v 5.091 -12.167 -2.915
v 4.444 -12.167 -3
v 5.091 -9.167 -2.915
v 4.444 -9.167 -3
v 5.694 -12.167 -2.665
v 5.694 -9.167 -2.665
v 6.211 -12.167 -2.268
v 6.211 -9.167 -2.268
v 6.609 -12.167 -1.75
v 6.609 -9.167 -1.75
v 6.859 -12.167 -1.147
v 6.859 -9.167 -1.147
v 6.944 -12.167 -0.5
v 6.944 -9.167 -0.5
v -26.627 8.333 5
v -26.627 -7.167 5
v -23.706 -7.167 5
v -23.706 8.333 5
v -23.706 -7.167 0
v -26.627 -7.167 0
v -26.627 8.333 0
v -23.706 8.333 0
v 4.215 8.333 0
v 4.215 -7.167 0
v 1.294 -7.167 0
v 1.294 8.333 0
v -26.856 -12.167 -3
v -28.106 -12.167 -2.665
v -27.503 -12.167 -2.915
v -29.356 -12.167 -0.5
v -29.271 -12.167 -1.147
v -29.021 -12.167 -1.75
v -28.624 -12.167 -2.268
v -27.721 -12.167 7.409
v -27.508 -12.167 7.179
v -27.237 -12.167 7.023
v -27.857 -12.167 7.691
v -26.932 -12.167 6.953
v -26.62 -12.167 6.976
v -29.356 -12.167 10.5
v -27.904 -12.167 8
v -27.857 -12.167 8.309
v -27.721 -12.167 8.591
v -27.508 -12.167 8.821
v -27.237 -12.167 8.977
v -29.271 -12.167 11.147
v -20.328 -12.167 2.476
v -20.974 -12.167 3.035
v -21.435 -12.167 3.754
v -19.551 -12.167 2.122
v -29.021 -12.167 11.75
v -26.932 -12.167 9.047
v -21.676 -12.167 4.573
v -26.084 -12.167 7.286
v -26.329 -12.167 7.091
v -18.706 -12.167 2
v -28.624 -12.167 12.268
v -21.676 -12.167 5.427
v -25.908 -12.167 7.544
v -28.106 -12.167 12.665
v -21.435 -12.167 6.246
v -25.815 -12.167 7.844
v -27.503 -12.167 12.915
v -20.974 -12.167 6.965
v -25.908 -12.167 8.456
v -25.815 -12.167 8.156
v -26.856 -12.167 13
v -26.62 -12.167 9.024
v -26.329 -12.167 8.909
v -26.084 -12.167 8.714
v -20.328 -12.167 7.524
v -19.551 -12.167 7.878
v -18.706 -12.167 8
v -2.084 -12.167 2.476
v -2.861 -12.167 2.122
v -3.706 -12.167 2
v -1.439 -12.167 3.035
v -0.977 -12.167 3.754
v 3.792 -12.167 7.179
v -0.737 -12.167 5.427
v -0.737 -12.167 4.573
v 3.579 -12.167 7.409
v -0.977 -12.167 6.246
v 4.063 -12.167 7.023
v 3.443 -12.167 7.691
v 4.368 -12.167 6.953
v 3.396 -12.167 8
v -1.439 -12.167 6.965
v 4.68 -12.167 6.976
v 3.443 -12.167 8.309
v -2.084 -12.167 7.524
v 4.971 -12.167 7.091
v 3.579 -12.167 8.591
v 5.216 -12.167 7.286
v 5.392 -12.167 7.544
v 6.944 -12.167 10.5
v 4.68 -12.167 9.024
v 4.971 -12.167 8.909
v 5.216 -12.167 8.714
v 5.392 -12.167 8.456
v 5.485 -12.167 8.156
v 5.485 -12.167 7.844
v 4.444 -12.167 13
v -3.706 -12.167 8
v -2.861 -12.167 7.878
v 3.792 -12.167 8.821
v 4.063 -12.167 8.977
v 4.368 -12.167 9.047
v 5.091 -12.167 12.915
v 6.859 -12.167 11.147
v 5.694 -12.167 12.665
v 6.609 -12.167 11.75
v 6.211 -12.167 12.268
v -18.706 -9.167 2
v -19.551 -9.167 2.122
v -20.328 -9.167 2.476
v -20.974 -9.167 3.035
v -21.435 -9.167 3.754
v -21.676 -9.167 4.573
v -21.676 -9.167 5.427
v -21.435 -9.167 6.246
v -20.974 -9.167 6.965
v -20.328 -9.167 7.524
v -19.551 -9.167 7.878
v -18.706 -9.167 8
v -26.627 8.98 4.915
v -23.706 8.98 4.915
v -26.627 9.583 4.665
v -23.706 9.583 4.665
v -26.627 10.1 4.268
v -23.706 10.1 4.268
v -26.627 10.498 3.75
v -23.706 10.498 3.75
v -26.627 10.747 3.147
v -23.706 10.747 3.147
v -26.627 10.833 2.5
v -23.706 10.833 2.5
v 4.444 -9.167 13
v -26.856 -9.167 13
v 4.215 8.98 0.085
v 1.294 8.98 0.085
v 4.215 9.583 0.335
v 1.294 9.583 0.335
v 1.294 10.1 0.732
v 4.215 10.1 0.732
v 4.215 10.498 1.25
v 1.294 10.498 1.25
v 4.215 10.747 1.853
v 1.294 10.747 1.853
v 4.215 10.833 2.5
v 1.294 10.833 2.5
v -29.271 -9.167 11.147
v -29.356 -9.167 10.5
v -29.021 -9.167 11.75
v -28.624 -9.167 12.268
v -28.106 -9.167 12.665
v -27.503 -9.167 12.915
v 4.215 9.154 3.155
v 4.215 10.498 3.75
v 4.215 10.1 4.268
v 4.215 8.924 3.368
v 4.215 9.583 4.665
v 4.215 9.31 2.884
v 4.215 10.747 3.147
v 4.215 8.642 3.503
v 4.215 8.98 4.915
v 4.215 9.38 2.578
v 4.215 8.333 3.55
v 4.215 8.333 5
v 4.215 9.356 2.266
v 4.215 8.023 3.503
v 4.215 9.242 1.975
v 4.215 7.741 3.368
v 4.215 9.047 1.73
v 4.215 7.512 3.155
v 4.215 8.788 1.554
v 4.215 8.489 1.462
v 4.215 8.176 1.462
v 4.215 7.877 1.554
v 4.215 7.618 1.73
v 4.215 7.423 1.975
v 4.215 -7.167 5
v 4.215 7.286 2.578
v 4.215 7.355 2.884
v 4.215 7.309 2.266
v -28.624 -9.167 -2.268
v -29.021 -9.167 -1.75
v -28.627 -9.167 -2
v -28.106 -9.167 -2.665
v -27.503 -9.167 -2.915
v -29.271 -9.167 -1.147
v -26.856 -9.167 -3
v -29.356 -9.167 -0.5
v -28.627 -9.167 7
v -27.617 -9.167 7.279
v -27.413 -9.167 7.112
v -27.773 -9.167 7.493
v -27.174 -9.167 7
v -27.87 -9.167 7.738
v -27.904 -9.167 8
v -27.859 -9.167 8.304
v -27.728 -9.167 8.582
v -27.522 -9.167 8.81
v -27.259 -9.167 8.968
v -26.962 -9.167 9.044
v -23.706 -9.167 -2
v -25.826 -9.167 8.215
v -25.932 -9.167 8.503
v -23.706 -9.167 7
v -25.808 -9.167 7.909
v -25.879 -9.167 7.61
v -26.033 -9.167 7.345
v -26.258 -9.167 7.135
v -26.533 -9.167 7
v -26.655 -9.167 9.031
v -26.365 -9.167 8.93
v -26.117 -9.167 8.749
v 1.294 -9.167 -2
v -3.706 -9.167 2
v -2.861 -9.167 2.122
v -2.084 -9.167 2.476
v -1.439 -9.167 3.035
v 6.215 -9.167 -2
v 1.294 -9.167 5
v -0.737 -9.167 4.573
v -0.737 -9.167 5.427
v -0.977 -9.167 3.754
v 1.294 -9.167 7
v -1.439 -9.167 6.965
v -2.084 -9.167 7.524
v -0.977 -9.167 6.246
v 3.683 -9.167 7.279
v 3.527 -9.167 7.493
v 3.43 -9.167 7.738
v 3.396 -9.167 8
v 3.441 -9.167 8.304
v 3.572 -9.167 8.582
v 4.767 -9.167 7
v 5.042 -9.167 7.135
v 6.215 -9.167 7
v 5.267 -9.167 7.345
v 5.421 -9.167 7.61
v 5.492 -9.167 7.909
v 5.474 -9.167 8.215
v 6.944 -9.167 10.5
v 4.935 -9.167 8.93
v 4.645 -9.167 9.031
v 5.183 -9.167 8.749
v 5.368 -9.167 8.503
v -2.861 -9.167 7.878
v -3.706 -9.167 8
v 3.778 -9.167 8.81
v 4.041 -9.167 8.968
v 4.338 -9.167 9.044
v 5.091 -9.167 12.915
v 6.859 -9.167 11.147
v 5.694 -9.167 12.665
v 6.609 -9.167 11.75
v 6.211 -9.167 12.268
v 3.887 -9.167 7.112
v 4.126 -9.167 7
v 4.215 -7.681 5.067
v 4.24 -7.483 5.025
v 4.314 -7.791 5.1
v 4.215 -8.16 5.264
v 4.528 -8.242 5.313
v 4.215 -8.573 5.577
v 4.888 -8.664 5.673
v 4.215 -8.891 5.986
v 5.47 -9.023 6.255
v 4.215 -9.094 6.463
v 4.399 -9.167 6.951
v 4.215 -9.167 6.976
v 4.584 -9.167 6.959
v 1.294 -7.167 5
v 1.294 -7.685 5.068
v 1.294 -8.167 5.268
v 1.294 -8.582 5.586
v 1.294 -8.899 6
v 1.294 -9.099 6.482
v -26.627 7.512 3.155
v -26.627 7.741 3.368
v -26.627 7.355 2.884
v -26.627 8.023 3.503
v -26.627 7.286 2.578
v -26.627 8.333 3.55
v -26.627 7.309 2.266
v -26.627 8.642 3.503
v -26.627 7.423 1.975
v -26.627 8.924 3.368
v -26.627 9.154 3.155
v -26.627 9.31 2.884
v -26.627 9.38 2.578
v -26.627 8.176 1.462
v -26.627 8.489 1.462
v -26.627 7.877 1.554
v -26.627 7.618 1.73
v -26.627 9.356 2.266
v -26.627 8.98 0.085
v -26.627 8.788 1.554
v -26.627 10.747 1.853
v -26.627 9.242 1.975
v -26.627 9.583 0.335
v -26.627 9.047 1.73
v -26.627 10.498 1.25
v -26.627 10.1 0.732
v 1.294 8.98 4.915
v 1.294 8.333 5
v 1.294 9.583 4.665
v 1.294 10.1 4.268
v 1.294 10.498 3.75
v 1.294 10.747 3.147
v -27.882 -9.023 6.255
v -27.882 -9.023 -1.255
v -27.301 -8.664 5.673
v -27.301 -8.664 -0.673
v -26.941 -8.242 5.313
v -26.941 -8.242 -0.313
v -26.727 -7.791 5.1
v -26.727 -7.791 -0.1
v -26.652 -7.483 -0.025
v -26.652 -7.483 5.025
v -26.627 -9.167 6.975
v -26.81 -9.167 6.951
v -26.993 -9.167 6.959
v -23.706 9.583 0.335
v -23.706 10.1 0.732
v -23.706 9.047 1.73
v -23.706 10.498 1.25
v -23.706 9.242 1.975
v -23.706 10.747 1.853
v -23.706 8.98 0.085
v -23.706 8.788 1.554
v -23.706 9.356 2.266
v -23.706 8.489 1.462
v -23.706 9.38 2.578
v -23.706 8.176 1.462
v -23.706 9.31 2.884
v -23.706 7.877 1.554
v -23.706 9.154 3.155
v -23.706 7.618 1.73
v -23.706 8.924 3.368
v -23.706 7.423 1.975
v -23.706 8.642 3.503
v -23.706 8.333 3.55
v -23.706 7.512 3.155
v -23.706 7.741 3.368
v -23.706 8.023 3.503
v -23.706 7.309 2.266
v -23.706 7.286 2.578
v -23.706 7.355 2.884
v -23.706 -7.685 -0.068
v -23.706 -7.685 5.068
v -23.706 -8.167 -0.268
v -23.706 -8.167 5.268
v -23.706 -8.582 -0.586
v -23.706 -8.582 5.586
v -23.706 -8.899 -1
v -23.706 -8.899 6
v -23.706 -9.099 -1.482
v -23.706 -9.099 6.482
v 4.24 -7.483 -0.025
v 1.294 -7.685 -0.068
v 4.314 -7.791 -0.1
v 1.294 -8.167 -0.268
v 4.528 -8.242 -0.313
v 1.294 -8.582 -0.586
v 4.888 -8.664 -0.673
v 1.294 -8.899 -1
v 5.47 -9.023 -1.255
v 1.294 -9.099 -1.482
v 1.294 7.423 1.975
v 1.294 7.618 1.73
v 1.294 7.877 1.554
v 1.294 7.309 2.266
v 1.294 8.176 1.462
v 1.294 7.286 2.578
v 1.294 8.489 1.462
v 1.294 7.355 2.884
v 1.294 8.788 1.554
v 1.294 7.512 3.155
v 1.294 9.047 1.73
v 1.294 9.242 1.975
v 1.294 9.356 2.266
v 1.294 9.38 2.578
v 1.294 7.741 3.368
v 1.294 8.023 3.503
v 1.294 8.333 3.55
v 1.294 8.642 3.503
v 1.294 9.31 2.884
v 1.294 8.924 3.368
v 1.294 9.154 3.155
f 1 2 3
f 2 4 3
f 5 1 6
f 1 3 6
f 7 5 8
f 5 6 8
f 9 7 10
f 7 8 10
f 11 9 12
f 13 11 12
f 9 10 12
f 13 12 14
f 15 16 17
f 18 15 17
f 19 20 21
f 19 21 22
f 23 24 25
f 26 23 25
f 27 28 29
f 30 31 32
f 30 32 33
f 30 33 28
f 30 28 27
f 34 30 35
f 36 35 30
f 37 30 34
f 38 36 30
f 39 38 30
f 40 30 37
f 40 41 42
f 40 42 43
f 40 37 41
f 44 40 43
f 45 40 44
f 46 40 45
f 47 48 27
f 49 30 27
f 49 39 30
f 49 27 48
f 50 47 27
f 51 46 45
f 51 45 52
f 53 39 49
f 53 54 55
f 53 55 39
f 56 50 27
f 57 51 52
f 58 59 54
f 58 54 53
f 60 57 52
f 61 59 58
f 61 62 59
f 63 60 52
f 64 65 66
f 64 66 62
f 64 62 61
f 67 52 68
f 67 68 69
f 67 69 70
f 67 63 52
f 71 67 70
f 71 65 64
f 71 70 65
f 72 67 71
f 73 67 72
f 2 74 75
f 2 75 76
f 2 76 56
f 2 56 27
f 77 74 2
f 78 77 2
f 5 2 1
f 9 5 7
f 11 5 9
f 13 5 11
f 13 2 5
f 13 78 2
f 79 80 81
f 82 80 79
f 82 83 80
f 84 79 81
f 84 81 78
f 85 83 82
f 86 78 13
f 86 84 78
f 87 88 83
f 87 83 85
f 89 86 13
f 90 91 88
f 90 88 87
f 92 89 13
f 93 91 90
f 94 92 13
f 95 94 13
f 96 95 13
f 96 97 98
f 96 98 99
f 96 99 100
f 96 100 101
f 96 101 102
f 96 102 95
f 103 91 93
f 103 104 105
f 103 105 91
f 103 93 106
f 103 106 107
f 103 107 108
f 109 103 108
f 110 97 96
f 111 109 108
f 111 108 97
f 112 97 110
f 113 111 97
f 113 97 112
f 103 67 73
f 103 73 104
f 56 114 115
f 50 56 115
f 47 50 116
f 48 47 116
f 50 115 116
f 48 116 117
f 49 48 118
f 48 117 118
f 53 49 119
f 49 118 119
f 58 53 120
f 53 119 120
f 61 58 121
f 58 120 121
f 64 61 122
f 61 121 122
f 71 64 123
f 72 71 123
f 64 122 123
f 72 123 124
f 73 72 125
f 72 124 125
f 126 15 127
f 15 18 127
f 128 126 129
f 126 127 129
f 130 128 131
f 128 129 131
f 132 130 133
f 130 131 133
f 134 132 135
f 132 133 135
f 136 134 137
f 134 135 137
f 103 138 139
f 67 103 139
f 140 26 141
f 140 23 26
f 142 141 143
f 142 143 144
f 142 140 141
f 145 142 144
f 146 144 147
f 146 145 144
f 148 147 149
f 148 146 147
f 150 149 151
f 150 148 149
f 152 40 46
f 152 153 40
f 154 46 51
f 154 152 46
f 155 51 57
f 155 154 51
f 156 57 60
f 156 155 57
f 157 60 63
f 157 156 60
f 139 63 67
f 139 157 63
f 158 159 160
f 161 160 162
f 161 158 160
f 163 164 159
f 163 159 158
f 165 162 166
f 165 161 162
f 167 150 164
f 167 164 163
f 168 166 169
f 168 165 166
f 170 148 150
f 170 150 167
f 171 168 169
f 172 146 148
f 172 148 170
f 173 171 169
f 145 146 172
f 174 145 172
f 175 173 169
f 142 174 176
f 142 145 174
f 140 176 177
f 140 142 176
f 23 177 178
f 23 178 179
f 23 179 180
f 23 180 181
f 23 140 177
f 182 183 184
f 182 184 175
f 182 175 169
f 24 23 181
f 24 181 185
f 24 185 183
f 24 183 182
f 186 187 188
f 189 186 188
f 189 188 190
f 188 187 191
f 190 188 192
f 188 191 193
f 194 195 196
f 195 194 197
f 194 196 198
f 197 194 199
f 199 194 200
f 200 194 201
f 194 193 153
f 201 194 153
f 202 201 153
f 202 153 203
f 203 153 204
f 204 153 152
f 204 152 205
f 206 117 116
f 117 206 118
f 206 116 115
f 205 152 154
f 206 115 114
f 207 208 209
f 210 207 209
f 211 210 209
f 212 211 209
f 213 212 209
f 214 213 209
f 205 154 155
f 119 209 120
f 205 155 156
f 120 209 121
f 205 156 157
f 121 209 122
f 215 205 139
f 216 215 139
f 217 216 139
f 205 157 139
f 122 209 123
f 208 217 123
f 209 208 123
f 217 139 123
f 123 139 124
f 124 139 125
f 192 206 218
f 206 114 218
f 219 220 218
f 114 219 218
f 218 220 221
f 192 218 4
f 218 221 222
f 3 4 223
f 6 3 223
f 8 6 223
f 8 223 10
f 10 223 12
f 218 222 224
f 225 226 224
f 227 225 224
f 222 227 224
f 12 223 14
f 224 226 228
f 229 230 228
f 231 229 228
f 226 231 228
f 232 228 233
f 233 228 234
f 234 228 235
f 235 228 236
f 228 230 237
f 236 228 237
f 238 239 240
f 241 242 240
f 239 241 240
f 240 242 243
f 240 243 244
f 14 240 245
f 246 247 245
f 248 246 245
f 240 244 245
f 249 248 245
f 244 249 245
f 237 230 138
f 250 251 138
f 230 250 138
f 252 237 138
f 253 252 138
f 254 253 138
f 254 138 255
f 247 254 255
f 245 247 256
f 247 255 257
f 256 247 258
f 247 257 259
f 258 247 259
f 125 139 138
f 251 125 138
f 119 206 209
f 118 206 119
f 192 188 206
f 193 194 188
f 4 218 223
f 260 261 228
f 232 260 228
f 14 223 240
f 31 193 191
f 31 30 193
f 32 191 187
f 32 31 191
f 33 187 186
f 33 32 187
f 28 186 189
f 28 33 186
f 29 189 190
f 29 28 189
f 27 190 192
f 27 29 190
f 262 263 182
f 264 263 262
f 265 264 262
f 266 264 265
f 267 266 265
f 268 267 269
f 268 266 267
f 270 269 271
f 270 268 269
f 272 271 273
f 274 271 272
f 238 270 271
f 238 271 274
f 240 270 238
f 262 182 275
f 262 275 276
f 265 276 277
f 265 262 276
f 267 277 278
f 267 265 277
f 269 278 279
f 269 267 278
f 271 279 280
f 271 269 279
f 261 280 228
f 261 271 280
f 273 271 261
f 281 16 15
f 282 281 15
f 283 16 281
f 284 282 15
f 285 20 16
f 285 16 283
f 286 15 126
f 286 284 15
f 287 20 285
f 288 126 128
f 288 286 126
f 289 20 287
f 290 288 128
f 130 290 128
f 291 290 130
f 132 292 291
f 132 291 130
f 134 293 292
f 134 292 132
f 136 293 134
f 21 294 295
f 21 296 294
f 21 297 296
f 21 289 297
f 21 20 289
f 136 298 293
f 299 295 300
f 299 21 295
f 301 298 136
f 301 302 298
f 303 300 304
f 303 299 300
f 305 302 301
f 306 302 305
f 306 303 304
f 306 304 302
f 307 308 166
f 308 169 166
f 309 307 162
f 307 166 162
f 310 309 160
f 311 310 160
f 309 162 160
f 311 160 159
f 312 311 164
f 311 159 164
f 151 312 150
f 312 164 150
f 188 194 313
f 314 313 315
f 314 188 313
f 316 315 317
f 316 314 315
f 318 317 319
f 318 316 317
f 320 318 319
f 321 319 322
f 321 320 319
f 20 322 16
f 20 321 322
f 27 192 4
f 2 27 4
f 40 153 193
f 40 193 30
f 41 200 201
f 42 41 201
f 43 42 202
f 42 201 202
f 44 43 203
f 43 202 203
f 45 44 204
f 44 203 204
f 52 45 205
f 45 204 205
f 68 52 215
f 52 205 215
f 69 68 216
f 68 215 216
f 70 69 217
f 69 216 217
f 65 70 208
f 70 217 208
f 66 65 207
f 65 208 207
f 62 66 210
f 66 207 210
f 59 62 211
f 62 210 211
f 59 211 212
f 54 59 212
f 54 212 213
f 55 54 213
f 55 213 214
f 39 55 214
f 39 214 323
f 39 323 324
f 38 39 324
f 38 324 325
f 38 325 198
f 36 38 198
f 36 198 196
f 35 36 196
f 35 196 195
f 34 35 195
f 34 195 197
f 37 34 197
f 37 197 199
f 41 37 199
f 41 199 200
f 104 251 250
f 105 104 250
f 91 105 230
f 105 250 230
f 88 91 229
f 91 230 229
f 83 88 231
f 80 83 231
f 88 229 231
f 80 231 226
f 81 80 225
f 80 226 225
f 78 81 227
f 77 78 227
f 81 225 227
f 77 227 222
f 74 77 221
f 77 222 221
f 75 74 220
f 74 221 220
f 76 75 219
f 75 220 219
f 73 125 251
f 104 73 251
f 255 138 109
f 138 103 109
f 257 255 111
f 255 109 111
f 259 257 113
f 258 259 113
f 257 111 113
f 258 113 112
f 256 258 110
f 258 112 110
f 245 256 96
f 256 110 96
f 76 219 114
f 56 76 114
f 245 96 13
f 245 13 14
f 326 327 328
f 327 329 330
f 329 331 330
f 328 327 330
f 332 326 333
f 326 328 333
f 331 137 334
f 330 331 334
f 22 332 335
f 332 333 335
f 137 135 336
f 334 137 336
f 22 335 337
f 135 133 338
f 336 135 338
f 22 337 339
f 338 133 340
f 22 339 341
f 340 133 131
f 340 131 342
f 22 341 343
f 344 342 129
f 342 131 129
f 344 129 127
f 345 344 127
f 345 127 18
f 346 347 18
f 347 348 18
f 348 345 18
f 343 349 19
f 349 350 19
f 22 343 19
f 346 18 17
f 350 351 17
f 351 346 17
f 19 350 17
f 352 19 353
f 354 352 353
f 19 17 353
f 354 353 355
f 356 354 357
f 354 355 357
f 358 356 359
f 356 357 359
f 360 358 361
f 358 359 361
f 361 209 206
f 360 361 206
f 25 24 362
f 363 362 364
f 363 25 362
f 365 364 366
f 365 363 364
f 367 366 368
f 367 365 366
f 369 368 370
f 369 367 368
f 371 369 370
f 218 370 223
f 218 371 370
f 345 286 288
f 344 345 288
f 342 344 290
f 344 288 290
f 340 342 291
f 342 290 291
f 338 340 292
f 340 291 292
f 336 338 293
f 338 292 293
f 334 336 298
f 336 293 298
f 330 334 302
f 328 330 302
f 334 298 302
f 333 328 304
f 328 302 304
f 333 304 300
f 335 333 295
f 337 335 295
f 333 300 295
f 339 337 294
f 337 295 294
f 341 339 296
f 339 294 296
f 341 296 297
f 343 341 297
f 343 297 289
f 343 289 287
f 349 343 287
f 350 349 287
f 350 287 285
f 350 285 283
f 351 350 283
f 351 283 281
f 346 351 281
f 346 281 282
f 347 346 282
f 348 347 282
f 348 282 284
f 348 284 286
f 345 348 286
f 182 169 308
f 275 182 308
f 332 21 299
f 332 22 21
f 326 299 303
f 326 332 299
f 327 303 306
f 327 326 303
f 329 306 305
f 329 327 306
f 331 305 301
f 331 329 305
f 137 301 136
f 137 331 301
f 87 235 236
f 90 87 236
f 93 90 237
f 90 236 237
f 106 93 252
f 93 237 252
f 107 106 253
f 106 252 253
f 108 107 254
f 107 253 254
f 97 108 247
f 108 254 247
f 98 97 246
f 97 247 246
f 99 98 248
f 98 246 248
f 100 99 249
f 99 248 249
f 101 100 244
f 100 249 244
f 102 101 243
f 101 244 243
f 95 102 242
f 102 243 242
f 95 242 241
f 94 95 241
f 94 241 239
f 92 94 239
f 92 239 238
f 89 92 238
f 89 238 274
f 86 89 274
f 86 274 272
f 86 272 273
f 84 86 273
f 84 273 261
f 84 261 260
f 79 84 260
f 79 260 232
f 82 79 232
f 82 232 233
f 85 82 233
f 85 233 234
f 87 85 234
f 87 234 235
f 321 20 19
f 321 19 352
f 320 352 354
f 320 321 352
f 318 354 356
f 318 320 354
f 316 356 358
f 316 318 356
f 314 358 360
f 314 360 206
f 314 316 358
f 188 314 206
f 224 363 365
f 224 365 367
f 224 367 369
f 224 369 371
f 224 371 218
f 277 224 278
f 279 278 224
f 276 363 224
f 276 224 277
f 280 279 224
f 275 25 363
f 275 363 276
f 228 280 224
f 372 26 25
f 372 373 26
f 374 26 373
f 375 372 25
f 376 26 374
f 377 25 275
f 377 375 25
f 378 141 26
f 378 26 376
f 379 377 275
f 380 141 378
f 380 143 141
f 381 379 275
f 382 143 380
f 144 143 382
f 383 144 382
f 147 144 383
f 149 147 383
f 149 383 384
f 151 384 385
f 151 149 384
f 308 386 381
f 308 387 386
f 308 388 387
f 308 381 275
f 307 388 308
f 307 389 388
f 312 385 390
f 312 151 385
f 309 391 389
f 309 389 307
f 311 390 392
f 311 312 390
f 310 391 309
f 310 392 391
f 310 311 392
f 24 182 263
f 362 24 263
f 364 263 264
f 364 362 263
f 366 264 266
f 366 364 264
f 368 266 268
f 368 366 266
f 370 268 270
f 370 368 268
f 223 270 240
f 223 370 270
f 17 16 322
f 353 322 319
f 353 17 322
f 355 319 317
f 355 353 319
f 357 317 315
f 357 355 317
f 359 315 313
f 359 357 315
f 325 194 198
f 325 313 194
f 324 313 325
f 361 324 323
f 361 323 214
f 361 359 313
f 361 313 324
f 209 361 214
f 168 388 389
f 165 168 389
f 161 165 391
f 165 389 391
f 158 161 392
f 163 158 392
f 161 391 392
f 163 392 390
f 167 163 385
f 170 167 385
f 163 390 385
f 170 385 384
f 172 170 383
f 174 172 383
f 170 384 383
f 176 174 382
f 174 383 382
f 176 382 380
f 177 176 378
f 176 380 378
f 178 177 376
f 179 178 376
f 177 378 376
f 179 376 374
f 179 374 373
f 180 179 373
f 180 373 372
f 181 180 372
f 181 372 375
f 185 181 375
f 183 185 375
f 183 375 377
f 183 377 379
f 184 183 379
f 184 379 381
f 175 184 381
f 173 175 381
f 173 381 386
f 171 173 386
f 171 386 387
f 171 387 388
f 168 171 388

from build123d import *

# Parameters (mm, degrees)
DODANIE_WYCI_GNI_CIE1_DEPTH = 5
DODANIE_WYCI_GNI_CIE4_DEPTH = 8
DODANIE_WYCI_GNI_CIE5_DEPTH = 3
SZKIC8_R                    = 1.05
WYTNIJ_WYCI_GNI_CIE1_DEPTH  = 38.825793195
SZKIC9_R                    = 1.05
WYTNIJ_WYCI_GNI_CIE2_DEPTH  = 39.000906522
ZAOKR_GLENIE1_R             = 2.5
ZAOKR_GLENIE2_R             = 2.5
ZAOKR_GLENIE3_R             = 2
WYTNIJ_WYCI_GNI_CIE3_DEPTH  = 38.825793195


# Some blends are built 0.0001 mm under size
with BuildPart() as part:
    # Szkic1 → Dodanie-wyciągnięcie1 (new body)
    with BuildSketch(Plane.XY):
        Polygon((6.943729276, -9.167385079), (6.943729276, -12.167385079), (-29.356270724, -12.167385079), (-29.356270724, -9.167385079), (-26.62744343, -9.167385079), (-26.62744343, 10.832614921), (-23.706270724, 10.832614921), (-23.706270724, -9.167385079), (1.293729276, -9.167385079), (1.293729276, 10.832614921), (4.214901981, 10.832614921), (4.214901981, -9.167385079), align=None)
    extrude(amount=DODANIE_WYCI_GNI_CIE1_DEPTH)

    # Szkic5 → Dodanie-wyciągnięcie4 (add)
    with BuildSketch(Plane.XY.offset(5)):
        Polygon((-26.62744343, -9.167385079), (-23.706270724, -9.167385079), (1.293729276, -9.167385079), (4.214901981, -9.167385079), (6.943729276, -9.167385079), (6.943729276, -12.167385079), (-29.356270724, -12.167385079), (-29.356270724, -9.167385079), align=None)
    extrude(amount=DODANIE_WYCI_GNI_CIE4_DEPTH)

    # Szkic7 → Dodanie-wyciągnięcie5 (add)
    with BuildSketch(Plane(origin=(0, 0, 0), x_dir=(-1, 0, 0), z_dir=(0, 0, -1))):
        Polygon((-4.214901981, -9.167385079), (-1.293729276, -9.167385079), (23.706270724, -9.167385079), (26.62744343, -9.167385079), (29.356270724, -9.167385079), (29.356270724, -12.167385079), (-6.943729276, -12.167385079), (-6.943729276, -9.167385079), align=None)
    extrude(amount=DODANIE_WYCI_GNI_CIE5_DEPTH)

    # Szkic8 → Wytnij-wyciągnięcie1 (cut, through all)
    with BuildSketch(Plane(origin=(0, -9.167385079, 0), x_dir=(1, 0, 0), z_dir=(0, 1, 0))):
        with Locations(Location((4.446418634, -8, 0), (0, 0, 180))):
            Circle(SZKIC8_R)
        with Locations(Location((-26.853581366, -8, 0), (0, 0, 180))):
            Circle(SZKIC8_R)
    extrude(amount=-WYTNIJ_WYCI_GNI_CIE1_DEPTH, mode=Mode.SUBTRACT)

    # Szkic9 → Wytnij-wyciągnięcie2 (cut, through all)
    with BuildSketch(Plane.ZY.offset(26.62744343)):
        with Locations((2.5, 8.332614921)):
            Circle(SZKIC9_R)
    extrude(amount=-WYTNIJ_WYCI_GNI_CIE2_DEPTH, mode=Mode.SUBTRACT)

    # Zaokrąglenie1
    zaokr_glenie1_edges = [part.edges().sort_by_distance(p)[0] for p in [
        (-29.356270724, -10.667385079, 13),
        (6.943729276, -10.667385079, 13),
        (6.943729276, -10.667385079, -3),
        (-29.356270724, -10.667385079, -3),
    ]]
    fillet(zaokr_glenie1_edges, radius=ZAOKR_GLENIE1_R)

    # Zaokrąglenie2
    zaokr_glenie2_edges = [part.edges().sort_by_distance(p)[0] for p in [
        (-25.166857077, 10.832614921, 5),
        (-25.166857077, 10.832614921, 0),
        (2.754315628, 10.832614921, 5),
        (2.754315628, 10.832614921, 0),
    ]]
    fillet(zaokr_glenie2_edges, radius=ZAOKR_GLENIE2_R - 0.0001)  # a hair under: the kernel refuses the full size

    # Zaokrąglenie3
    # the kernel refuses this fillet: 2 mm, written as the material it adds along each edge
    with BuildSketch(Plane(origin=(4.214901981, -9.167385079, 0), x_dir=(1, 0, 0), z_dir=(0, 0, 1))) as zaokr_glenie3_piece_1:
        with BuildLine():
            CenterArc((ZAOKR_GLENIE3_R, ZAOKR_GLENIE3_R), ZAOKR_GLENIE3_R, 180, 90)
            Line((0, ZAOKR_GLENIE3_R), (0, 0))
            Line((0, 0), (ZAOKR_GLENIE3_R, 0))
        make_face()
    extrude(amount=5)
    with BuildSketch(Plane(origin=(-26.62744343, -9.167385079, 0), x_dir=(-1, 0, 0), z_dir=(0, 0, 1))) as zaokr_glenie3_piece_2:
        with BuildLine():
            CenterArc((ZAOKR_GLENIE3_R, -ZAOKR_GLENIE3_R), ZAOKR_GLENIE3_R, 90, 90)
            Line((0, -ZAOKR_GLENIE3_R), (0, 0))
            Line((0, 0), (ZAOKR_GLENIE3_R, 0))
        make_face()
    extrude(amount=5)
    with BuildSketch(Plane(origin=(-23.706270724, -9.167385079, 5), x_dir=(0, 1, 0), z_dir=(-1, 0, 0))) as zaokr_glenie3_piece_3_section:
        with BuildLine():
            CenterArc((ZAOKR_GLENIE3_R, -ZAOKR_GLENIE3_R), ZAOKR_GLENIE3_R, 90, 90)
            Line((0, -ZAOKR_GLENIE3_R), (0, 0))
            Line((0, 0), (ZAOKR_GLENIE3_R, 0))
        make_face()
    zaokr_glenie3_piece_3 = extrude(amount=2.921172706, mode=Mode.PRIVATE)
    zaokr_glenie3_piece_3 = zaokr_glenie3_piece_3 - Plane(origin=(-26.853581366, -8.714586813, 8), x_dir=(-1, 0, 0), z_dir=(0, 1, 0)) * Cylinder(1.05, 14, mode=Mode.PRIVATE)
    add(zaokr_glenie3_piece_3)
    with BuildSketch(Plane(origin=(4.214901981, -9.167385079, 5), x_dir=(0, 0, 1), z_dir=(-1, 0, 0))) as zaokr_glenie3_piece_4_section:
        with BuildLine():
            CenterArc((ZAOKR_GLENIE3_R, ZAOKR_GLENIE3_R), ZAOKR_GLENIE3_R, 180, 90)
            Line((0, ZAOKR_GLENIE3_R), (0, 0))
            Line((0, 0), (ZAOKR_GLENIE3_R, 0))
        make_face()
    zaokr_glenie3_piece_4 = extrude(amount=2.921172706, mode=Mode.PRIVATE)
    zaokr_glenie3_piece_4 = zaokr_glenie3_piece_4 - Plane(origin=(4.446418634, -8.714587659, 8), x_dir=(-1, 0, 0), z_dir=(0, 1, 0)) * Cylinder(1.05, 14, mode=Mode.PRIVATE)
    add(zaokr_glenie3_piece_4)
    with BuildSketch(Plane(origin=(1.293729276, -9.167385079, 0), x_dir=(0, 0, -1), z_dir=(1, 0, 0))) as zaokr_glenie3_piece_5:
        with BuildLine():
            CenterArc((ZAOKR_GLENIE3_R, ZAOKR_GLENIE3_R), ZAOKR_GLENIE3_R, 180, 90)
            Line((0, ZAOKR_GLENIE3_R), (0, 0))
            Line((0, 0), (ZAOKR_GLENIE3_R, 0))
        make_face()
    extrude(amount=2.921172706)
    with BuildSketch(Plane(origin=(-26.62744343, -9.167385079, 0), x_dir=(0, 1, 0), z_dir=(1, 0, 0))) as zaokr_glenie3_piece_6:
        with BuildLine():
            CenterArc((ZAOKR_GLENIE3_R, -ZAOKR_GLENIE3_R), ZAOKR_GLENIE3_R, 90, 90)
            Line((0, -ZAOKR_GLENIE3_R), (0, 0))
            Line((0, 0), (ZAOKR_GLENIE3_R, 0))
        make_face()
    extrude(amount=2.921172706)
    with BuildSketch(Plane(origin=(4.214901981, -9.167385079, -5), x_dir=(1, 0, 0), z_dir=(0, 0, 1))) as zaokr_glenie3_piece_7a_section:
        with BuildLine():
            CenterArc((ZAOKR_GLENIE3_R, ZAOKR_GLENIE3_R), ZAOKR_GLENIE3_R, 180, 90)
            Line((0, ZAOKR_GLENIE3_R), (0, 0))
            Line((0, 0), (ZAOKR_GLENIE3_R, 0))
        make_face()
    zaokr_glenie3_piece_7a = extrude(amount=10, mode=Mode.PRIVATE)
    zaokr_glenie3_piece_7a = zaokr_glenie3_piece_7a & Plane(origin=(4.443729276, -8.70886388, -0.5), x_dir=(1, 0, 0), z_dir=(0, 1, 0)) * Cylinder(2.5, 28, mode=Mode.PRIVATE)
    zaokr_glenie3_piece_7a = split(zaokr_glenie3_piece_7a, bisect_by=Plane(origin=(4.654982767, -8.70886388, 0), z_dir=(0, 0, -1)), keep=Keep.TOP, mode=Mode.PRIVATE)
    with BuildSketch(Plane(origin=(1.293729276, -9.167385079, 0), x_dir=(0, 0, -1), z_dir=(1, 0, 0))) as zaokr_glenie3_piece_7b_section:
        with BuildLine():
            CenterArc((ZAOKR_GLENIE3_R, ZAOKR_GLENIE3_R), ZAOKR_GLENIE3_R, 180, 90)
            Line((0, ZAOKR_GLENIE3_R), (0, 0))
            Line((0, 0), (ZAOKR_GLENIE3_R, 0))
        make_face()
    zaokr_glenie3_piece_7b = extrude(amount=7.921172706, mode=Mode.PRIVATE)
    zaokr_glenie3_piece_7b = zaokr_glenie3_piece_7b & Plane(origin=(4.443729276, -8.713013539, -0.5), x_dir=(1, 0, 0), z_dir=(0, 1, 0)) * Cylinder(2.5, 24, mode=Mode.PRIVATE)
    zaokr_glenie3_piece_7b = split(zaokr_glenie3_piece_7b, bisect_by=Plane(origin=(4.214901981, -8.713013539, -0.447003407), z_dir=(1, 0, 0)), keep=Keep.TOP, mode=Mode.PRIVATE)
    zaokr_glenie3_piece_7 = zaokr_glenie3_piece_7a & zaokr_glenie3_piece_7b
    add(zaokr_glenie3_piece_7)
    with BuildSketch(Plane(origin=(4.214901981, -9.167385079, 0), x_dir=(1, 0, 0), z_dir=(0, 0, 1))) as zaokr_glenie3_piece_8a_section:
        with BuildLine():
            CenterArc((ZAOKR_GLENIE3_R, ZAOKR_GLENIE3_R), ZAOKR_GLENIE3_R, 180, 90)
            Line((0, ZAOKR_GLENIE3_R), (0, 0))
            Line((0, 0), (ZAOKR_GLENIE3_R, 0))
        make_face()
    zaokr_glenie3_piece_8a = extrude(amount=10, mode=Mode.PRIVATE)
    zaokr_glenie3_piece_8a = zaokr_glenie3_piece_8a - Plane(origin=(4.446418634, -9.113524986, 8), x_dir=(-1, 0, 0), z_dir=(0, 1, 0)) * Cylinder(1.05, 28, mode=Mode.PRIVATE)
    zaokr_glenie3_piece_8a = split(zaokr_glenie3_piece_8a, bisect_by=Plane(origin=(5.693435365, -9.113524986, 5), z_dir=(0, 0, 1)), keep=Keep.TOP, mode=Mode.PRIVATE)
    with BuildSketch(Plane(origin=(9.214901981, -9.167385079, 5), x_dir=(0, 0, 1), z_dir=(-1, 0, 0))) as zaokr_glenie3_piece_8b_section:
        with BuildLine():
            CenterArc((ZAOKR_GLENIE3_R, ZAOKR_GLENIE3_R), ZAOKR_GLENIE3_R, 180, 90)
            Line((0, ZAOKR_GLENIE3_R), (0, 0))
            Line((0, 0), (ZAOKR_GLENIE3_R, 0))
        make_face()
    zaokr_glenie3_piece_8b = extrude(amount=7.921172706, mode=Mode.PRIVATE)
    zaokr_glenie3_piece_8b = split(zaokr_glenie3_piece_8b, bisect_by=Plane(origin=(6.943729276, -8.714456285, 5.452342783), z_dir=(-1, 0, 0)), keep=Keep.TOP, mode=Mode.PRIVATE)
    zaokr_glenie3_piece_8b = zaokr_glenie3_piece_8b - Plane(origin=(4.446418634, -8.714456285, 8), x_dir=(-1, 0, 0), z_dir=(0, 1, 0)) * Cylinder(1.05, 24, mode=Mode.PRIVATE)
    zaokr_glenie3_piece_8b = split(zaokr_glenie3_piece_8b, bisect_by=Plane(origin=(4.214901981, -8.714456285, 5.452342783), z_dir=(1, 0, 0)), keep=Keep.TOP, mode=Mode.PRIVATE)
    zaokr_glenie3_piece_8 = zaokr_glenie3_piece_8a & zaokr_glenie3_piece_8b
    add(zaokr_glenie3_piece_8)
    with BuildSketch(Plane(origin=(-31.62744343, -9.167385079, 0), x_dir=(0, 1, 0), z_dir=(1, 0, 0))) as zaokr_glenie3_piece_9a_section:
        with BuildLine():
            CenterArc((ZAOKR_GLENIE3_R, -ZAOKR_GLENIE3_R), ZAOKR_GLENIE3_R, 90, 90)
            Line((0, -ZAOKR_GLENIE3_R), (0, 0))
            Line((0, 0), (ZAOKR_GLENIE3_R, 0))
        make_face()
    zaokr_glenie3_piece_9a = extrude(amount=7.921172706, mode=Mode.PRIVATE)
    zaokr_glenie3_piece_9a = split(zaokr_glenie3_piece_9a, bisect_by=Plane(origin=(-26.62744343, -8.713013524, -0.447003529), z_dir=(-1, 0, 0)), keep=Keep.TOP, mode=Mode.PRIVATE)
    zaokr_glenie3_piece_9a = zaokr_glenie3_piece_9a & Plane(origin=(-26.856270724, -8.713013524, -0.5), x_dir=(0, 0, -1), z_dir=(0, -1, 0)) * Cylinder(2.5, 24, mode=Mode.PRIVATE)
    with BuildSketch(Plane(origin=(-26.62744343, -9.167385079, -5), x_dir=(-1, 0, 0), z_dir=(0, 0, 1))) as zaokr_glenie3_piece_9b_section:
        with BuildLine():
            CenterArc((ZAOKR_GLENIE3_R, -ZAOKR_GLENIE3_R), ZAOKR_GLENIE3_R, 90, 90)
            Line((0, -ZAOKR_GLENIE3_R), (0, 0))
            Line((0, 0), (ZAOKR_GLENIE3_R, 0))
        make_face()
    zaokr_glenie3_piece_9b = extrude(amount=10, mode=Mode.PRIVATE)
    zaokr_glenie3_piece_9b = split(zaokr_glenie3_piece_9b, bisect_by=Plane(origin=(-27.067524529, -8.708863922, 0), z_dir=(0, 0, -1)), keep=Keep.TOP, mode=Mode.PRIVATE)
    zaokr_glenie3_piece_9b = zaokr_glenie3_piece_9b & Plane(origin=(-26.856270724, -8.708863922, -0.5), x_dir=(0, 0, -1), z_dir=(0, -1, 0)) * Cylinder(2.5, 29, mode=Mode.PRIVATE)
    zaokr_glenie3_piece_9 = zaokr_glenie3_piece_9a & zaokr_glenie3_piece_9b
    add(zaokr_glenie3_piece_9)
    with BuildSketch(Plane(origin=(-23.706270724, -9.167385079, 5), x_dir=(0, 1, 0), z_dir=(-1, 0, 0))) as zaokr_glenie3_piece_10a_section:
        with BuildLine():
            CenterArc((ZAOKR_GLENIE3_R, -ZAOKR_GLENIE3_R), ZAOKR_GLENIE3_R, 90, 90)
            Line((0, -ZAOKR_GLENIE3_R), (0, 0))
            Line((0, 0), (ZAOKR_GLENIE3_R, 0))
        make_face()
    zaokr_glenie3_piece_10a = extrude(amount=7.921172706, mode=Mode.PRIVATE)
    zaokr_glenie3_piece_10a = split(zaokr_glenie3_piece_10a, bisect_by=Plane(origin=(-26.62744343, -8.714457191, 5.452345725), z_dir=(-1, 0, 0)), keep=Keep.TOP, mode=Mode.PRIVATE)
    zaokr_glenie3_piece_10a = split(zaokr_glenie3_piece_10a, bisect_by=Plane(origin=(-29.356270724, -8.714457191, 5.452345725), z_dir=(1, 0, 0)), keep=Keep.TOP, mode=Mode.PRIVATE)
    zaokr_glenie3_piece_10a = zaokr_glenie3_piece_10a - Plane(origin=(-26.853581366, -8.714457191, 8), x_dir=(-1, 0, 0), z_dir=(0, 1, 0)) * Cylinder(1.05, 24, mode=Mode.PRIVATE)
    with BuildSketch(Plane(origin=(-26.62744343, -9.167385079, 0), x_dir=(-1, 0, 0), z_dir=(0, 0, 1))) as zaokr_glenie3_piece_10b_section:
        with BuildLine():
            CenterArc((ZAOKR_GLENIE3_R, -ZAOKR_GLENIE3_R), ZAOKR_GLENIE3_R, 90, 90)
            Line((0, -ZAOKR_GLENIE3_R), (0, 0))
            Line((0, 0), (ZAOKR_GLENIE3_R, 0))
        make_face()
    zaokr_glenie3_piece_10b = extrude(amount=10, mode=Mode.PRIVATE)
    zaokr_glenie3_piece_10b = split(zaokr_glenie3_piece_10b, bisect_by=Plane(origin=(-28.105975739, -9.113528996, 5), z_dir=(0, 0, 1)), keep=Keep.TOP, mode=Mode.PRIVATE)
    zaokr_glenie3_piece_10b = zaokr_glenie3_piece_10b - Plane(origin=(-26.853581366, -9.113528996, 8), x_dir=(-1, 0, 0), z_dir=(0, 1, 0)) * Cylinder(1.05, 29, mode=Mode.PRIVATE)
    zaokr_glenie3_piece_10 = zaokr_glenie3_piece_10a & zaokr_glenie3_piece_10b
    add(zaokr_glenie3_piece_10)

    # Szkic10 → Wytnij-wyciągnięcie3 (cut, through all)
    with BuildSketch(Plane(origin=(0, -9.167385079, 0), x_dir=(1, 0, 0), z_dir=(0, 1, 0))):
        with BuildLine():
            Line((-18.706270724, -8), (-3.706270724, -8))
            ThreePointArc((-3.706270724, -8), (-0.706270724, -5), (-3.706270724, -2))
            Line((-3.706270724, -2), (-18.706270724, -2))
            ThreePointArc((-18.706270724, -2), (-21.706270724, -5), (-18.706270724, -8))
        make_face()
    extrude(amount=-WYTNIJ_WYCI_GNI_CIE3_DEPTH, mode=Mode.SUBTRACT)


solid = part.part
